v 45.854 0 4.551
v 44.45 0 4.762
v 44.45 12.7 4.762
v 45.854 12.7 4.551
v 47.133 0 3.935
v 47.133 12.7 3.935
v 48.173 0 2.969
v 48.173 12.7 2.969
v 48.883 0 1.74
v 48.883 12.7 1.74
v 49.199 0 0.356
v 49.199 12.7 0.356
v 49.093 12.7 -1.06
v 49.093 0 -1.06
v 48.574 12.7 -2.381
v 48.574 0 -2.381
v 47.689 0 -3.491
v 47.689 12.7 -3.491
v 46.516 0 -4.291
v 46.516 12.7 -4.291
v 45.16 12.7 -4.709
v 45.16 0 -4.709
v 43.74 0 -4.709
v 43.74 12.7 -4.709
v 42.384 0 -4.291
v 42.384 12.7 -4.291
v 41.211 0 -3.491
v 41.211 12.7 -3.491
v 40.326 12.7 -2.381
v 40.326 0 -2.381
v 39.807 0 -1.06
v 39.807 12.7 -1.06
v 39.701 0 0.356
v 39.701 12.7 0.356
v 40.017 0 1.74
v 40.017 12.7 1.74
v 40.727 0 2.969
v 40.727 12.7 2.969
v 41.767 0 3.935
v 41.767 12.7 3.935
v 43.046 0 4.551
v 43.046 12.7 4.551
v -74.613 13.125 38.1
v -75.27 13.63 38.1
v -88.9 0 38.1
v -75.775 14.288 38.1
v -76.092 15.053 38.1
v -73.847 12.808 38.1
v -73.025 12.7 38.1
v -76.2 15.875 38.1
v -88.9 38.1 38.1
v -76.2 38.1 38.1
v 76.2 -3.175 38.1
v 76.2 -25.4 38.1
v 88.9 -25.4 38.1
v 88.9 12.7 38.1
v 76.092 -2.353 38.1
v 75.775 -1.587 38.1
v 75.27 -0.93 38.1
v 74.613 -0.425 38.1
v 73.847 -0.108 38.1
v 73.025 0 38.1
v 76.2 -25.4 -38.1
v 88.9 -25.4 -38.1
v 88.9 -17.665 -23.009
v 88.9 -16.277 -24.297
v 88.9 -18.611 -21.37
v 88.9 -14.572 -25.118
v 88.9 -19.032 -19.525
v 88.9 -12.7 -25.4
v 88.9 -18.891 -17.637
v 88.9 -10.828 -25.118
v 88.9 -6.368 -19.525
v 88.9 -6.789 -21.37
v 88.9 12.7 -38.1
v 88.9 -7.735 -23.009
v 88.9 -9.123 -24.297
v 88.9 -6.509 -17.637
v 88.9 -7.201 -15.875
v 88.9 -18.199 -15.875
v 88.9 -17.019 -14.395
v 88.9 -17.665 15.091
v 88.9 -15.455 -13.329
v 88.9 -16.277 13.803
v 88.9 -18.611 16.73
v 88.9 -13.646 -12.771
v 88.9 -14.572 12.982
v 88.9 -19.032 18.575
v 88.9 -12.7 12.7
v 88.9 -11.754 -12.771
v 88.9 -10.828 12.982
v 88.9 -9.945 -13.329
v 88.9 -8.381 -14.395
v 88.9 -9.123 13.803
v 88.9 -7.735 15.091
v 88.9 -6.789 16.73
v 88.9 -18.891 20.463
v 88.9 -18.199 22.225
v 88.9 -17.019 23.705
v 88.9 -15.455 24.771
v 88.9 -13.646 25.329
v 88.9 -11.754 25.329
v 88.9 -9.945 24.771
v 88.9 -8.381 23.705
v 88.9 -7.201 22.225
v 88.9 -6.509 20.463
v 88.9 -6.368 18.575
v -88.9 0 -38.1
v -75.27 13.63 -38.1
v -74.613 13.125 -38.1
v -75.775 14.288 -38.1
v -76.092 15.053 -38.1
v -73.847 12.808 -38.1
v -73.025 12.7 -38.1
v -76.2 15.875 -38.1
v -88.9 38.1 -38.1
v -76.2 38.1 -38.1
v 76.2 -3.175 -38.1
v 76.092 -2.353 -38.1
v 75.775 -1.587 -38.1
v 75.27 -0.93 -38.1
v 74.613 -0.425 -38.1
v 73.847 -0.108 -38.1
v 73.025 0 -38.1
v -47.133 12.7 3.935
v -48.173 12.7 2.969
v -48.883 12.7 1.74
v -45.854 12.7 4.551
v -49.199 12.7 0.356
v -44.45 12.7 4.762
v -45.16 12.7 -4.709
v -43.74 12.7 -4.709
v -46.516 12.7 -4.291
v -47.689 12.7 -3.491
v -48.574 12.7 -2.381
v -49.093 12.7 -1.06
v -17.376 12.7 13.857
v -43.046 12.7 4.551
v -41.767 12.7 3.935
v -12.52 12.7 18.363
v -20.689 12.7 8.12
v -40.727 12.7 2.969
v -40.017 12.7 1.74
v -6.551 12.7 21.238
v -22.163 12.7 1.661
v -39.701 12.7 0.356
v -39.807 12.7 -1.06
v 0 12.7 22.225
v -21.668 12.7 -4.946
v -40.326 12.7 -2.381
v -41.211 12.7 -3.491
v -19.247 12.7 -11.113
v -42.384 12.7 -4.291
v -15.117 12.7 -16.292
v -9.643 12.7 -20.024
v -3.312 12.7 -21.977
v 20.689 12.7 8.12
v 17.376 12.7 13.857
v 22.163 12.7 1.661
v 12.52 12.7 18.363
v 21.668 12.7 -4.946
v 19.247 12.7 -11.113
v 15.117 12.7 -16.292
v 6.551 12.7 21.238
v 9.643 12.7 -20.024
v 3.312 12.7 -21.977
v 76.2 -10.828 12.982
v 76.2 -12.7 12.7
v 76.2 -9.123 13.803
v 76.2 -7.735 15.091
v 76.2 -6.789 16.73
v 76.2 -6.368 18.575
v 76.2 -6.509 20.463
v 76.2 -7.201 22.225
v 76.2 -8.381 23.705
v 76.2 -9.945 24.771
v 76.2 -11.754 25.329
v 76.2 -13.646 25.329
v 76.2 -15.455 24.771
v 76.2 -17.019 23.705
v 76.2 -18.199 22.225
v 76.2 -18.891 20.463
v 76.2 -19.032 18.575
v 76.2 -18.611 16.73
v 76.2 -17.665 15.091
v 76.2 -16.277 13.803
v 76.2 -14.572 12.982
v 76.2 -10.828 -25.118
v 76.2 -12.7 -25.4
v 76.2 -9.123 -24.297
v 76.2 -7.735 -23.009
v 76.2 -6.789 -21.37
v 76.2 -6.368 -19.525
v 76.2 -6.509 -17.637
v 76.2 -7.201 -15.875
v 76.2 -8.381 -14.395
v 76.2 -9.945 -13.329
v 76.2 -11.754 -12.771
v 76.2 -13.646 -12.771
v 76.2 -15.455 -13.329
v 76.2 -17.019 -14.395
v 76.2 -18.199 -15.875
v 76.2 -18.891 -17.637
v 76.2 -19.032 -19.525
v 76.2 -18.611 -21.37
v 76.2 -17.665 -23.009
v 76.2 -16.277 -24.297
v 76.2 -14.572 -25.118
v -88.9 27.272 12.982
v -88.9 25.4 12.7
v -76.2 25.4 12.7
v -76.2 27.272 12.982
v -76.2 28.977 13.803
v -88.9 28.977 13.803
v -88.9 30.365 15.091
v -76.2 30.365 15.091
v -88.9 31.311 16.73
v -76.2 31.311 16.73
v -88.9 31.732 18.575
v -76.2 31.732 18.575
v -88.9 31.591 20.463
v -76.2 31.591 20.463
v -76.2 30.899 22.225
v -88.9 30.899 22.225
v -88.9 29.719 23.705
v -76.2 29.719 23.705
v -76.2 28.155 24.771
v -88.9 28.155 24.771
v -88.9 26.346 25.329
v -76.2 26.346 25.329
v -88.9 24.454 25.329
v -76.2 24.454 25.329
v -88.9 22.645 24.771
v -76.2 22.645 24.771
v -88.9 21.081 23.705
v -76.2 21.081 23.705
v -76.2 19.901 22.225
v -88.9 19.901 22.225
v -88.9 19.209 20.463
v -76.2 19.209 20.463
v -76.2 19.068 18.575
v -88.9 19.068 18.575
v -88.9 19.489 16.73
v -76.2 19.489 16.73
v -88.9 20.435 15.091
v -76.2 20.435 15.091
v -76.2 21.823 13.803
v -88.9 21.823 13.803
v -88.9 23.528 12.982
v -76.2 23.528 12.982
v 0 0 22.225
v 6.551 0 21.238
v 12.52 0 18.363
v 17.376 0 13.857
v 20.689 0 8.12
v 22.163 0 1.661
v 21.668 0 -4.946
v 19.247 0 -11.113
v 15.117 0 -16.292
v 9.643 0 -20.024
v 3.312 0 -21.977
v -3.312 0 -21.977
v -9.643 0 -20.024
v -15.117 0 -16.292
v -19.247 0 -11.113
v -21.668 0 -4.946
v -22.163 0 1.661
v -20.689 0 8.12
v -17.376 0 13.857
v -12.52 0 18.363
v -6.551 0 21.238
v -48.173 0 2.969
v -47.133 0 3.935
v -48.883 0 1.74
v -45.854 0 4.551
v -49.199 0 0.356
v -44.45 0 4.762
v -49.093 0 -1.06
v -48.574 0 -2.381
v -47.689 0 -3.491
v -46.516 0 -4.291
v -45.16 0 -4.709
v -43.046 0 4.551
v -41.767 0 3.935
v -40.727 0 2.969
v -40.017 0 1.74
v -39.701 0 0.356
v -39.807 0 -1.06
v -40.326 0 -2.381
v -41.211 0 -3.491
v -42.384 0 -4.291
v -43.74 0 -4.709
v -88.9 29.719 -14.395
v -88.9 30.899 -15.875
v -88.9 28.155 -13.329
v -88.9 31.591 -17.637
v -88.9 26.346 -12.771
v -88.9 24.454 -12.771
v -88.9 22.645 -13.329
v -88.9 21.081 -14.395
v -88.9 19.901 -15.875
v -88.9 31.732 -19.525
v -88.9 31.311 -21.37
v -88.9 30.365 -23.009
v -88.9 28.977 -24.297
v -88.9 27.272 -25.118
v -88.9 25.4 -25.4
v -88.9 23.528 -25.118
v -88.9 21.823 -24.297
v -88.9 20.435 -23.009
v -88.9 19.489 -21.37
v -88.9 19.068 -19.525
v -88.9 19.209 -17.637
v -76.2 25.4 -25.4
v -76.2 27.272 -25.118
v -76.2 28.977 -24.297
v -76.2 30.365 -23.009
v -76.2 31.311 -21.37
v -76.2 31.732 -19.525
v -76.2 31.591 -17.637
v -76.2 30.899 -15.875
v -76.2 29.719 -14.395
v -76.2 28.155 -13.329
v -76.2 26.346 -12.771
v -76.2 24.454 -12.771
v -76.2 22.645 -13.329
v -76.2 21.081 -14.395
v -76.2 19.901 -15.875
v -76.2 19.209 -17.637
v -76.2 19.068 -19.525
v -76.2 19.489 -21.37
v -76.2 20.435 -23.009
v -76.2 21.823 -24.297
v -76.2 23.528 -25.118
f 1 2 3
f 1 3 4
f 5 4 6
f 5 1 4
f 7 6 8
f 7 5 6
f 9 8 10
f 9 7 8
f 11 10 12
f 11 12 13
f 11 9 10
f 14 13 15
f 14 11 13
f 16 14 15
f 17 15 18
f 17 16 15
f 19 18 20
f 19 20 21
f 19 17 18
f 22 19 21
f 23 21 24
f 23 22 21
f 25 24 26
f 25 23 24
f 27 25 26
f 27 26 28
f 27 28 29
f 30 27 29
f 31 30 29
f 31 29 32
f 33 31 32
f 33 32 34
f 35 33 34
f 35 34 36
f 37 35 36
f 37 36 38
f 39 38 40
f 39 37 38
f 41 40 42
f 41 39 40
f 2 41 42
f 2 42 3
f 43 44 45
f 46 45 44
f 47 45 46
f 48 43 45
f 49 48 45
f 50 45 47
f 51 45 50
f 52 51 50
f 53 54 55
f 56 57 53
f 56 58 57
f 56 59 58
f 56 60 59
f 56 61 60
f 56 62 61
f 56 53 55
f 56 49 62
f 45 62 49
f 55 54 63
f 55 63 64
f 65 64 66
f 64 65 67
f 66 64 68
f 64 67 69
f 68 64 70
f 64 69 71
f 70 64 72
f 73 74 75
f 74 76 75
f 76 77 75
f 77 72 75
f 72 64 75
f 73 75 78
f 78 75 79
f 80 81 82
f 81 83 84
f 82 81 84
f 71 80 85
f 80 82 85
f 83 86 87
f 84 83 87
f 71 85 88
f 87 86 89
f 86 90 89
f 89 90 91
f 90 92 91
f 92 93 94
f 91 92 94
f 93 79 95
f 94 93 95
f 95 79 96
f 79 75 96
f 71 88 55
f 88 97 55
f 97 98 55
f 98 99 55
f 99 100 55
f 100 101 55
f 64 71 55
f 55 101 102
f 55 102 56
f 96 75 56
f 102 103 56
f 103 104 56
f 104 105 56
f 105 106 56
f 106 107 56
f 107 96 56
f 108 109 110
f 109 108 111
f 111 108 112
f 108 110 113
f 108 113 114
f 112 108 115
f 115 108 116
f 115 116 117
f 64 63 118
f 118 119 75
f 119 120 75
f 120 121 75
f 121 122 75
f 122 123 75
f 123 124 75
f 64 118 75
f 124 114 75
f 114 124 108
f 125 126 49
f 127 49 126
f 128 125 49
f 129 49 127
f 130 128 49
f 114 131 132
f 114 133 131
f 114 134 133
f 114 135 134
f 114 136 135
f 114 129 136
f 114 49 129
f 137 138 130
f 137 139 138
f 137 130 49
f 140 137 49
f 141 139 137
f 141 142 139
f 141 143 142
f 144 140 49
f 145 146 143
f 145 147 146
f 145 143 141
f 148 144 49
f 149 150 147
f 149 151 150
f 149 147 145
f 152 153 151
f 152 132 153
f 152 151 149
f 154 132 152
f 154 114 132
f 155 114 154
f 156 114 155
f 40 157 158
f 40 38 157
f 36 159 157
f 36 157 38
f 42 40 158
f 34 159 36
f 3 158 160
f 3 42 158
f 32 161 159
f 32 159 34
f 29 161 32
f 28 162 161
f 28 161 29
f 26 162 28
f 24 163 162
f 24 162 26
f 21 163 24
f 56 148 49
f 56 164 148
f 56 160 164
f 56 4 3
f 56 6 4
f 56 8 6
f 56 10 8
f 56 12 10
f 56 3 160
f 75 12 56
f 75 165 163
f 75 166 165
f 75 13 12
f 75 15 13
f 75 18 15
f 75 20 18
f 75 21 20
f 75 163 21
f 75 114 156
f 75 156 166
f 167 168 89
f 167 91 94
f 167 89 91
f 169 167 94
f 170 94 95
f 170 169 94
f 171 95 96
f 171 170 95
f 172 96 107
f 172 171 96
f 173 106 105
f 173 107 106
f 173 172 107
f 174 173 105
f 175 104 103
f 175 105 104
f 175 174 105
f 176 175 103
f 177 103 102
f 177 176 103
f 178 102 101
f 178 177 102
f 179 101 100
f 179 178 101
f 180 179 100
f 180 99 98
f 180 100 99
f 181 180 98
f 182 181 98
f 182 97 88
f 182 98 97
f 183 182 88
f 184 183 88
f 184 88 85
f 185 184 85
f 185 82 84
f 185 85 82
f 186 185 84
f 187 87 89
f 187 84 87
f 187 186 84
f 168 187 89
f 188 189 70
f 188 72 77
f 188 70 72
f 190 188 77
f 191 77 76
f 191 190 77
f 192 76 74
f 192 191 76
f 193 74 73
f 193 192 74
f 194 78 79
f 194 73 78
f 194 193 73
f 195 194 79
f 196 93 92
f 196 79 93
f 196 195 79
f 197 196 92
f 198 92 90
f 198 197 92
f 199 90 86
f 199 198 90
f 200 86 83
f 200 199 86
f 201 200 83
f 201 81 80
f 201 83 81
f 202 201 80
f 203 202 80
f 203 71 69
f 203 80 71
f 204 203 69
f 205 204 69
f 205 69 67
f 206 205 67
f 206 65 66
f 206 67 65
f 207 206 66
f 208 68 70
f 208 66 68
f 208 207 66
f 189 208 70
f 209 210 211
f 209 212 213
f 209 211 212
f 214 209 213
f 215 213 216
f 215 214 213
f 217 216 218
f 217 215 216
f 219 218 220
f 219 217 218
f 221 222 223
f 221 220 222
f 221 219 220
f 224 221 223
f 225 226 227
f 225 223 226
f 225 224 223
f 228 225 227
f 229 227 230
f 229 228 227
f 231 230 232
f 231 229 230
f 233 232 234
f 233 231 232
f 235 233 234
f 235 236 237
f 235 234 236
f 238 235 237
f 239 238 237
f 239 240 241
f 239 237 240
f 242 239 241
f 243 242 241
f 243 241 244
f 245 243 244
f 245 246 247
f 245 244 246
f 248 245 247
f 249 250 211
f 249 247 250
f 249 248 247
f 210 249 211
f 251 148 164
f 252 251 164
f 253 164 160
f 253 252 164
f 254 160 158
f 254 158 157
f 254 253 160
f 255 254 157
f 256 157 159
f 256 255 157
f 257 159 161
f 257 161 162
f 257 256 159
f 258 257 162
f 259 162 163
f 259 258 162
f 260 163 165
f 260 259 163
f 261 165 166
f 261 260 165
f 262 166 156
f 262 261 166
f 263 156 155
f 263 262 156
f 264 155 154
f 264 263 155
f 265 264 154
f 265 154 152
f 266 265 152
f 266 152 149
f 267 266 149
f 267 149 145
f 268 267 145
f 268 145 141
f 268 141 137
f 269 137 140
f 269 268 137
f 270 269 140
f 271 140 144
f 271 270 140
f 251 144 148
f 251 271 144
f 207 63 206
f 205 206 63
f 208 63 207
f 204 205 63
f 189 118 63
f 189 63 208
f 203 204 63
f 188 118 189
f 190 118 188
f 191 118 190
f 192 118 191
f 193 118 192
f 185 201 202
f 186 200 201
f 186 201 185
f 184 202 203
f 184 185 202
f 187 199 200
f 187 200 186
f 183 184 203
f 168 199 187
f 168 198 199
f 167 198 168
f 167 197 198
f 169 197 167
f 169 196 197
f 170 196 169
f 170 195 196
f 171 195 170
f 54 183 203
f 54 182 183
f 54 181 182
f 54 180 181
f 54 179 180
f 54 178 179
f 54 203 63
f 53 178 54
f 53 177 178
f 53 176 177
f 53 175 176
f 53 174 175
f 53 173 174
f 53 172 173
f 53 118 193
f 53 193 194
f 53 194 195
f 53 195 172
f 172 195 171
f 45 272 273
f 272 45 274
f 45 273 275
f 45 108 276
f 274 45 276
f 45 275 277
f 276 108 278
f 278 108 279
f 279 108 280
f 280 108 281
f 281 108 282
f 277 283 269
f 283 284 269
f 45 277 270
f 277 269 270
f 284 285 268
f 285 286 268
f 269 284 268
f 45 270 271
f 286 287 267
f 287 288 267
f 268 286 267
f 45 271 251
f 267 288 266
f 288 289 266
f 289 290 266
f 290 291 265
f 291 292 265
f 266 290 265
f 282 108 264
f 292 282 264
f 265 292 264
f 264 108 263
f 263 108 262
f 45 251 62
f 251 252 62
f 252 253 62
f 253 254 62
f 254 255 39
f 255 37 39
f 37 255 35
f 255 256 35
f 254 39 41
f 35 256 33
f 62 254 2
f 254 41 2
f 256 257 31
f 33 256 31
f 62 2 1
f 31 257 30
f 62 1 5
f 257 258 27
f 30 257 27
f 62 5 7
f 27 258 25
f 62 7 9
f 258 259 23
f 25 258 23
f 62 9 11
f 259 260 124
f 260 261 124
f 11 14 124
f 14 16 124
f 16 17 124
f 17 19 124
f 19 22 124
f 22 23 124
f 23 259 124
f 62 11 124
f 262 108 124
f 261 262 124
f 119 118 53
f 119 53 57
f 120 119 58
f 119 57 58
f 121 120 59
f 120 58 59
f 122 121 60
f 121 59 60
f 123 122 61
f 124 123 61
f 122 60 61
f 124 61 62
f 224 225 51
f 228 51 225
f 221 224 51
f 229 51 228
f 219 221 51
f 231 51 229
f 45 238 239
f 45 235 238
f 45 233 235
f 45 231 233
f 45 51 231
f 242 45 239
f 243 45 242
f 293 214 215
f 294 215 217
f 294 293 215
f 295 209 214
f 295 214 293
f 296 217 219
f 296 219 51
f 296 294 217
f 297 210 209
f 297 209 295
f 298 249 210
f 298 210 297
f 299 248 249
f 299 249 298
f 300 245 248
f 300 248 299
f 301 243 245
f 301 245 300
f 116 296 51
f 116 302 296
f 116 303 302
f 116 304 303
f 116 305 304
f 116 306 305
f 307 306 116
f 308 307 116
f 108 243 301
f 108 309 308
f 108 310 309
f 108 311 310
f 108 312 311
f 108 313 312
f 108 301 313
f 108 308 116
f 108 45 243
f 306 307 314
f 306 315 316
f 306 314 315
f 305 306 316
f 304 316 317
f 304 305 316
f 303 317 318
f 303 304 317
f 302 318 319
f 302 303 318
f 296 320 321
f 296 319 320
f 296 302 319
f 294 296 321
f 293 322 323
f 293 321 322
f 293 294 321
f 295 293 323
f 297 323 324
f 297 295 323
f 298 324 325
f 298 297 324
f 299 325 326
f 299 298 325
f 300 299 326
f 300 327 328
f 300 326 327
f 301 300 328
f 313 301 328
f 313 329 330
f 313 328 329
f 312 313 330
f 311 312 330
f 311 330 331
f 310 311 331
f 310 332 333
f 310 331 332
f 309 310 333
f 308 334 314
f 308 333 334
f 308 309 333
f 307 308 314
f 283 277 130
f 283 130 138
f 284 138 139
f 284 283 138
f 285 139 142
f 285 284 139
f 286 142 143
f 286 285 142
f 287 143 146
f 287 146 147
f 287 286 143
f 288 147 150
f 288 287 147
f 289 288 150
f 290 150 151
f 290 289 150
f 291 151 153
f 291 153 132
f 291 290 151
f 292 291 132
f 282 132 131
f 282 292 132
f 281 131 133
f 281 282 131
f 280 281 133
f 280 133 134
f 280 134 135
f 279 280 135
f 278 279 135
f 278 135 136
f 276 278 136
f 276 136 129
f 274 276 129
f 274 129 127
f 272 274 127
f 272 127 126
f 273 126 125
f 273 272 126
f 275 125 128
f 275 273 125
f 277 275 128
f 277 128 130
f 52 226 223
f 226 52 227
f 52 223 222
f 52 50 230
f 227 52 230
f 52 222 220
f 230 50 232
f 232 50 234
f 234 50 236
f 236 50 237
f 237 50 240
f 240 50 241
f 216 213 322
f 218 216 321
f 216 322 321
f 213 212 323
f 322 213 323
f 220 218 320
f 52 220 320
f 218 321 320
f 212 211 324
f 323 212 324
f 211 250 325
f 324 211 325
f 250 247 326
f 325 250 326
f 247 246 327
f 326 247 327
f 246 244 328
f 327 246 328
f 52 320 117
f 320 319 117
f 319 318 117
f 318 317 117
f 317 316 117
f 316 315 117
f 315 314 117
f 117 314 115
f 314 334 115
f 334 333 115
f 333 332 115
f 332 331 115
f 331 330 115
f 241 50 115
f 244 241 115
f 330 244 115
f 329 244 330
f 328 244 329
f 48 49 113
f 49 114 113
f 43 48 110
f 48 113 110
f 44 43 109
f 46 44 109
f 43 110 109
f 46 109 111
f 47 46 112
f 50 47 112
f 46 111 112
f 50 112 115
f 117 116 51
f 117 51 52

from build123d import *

# Parameters (mm, degrees)
SKETCH1_W               = 177.8
SKETCH1_H               = 76.2
SKETCH1_R               = 22.225
SKETCH1_R_2             = 4.7625
BOSS_EXTRUDE1_DEPTH     = 12.7
SKETCH2_W               = 12.7
SKETCH2_H               = 76.2
BOSS_EXTRUDE2_DEPTH     = 25.4
SKETCH3_W               = 12.7
SKETCH3_H               = 76.2
BOSS_EXTRUDE3_DEPTH     = 25.4
CUT_EXTRUDE1_DEPTH      = 174.669888006
CUT_EXTRUDE1_DEPTH_BACK = 174.669888006
SKETCH4_R               = 6.35
FILLET1_R               = 3.175


with BuildPart() as part:
    # Sketch1 → Boss-Extrude1 (new body)
    with BuildSketch(Plane(origin=(0, 0, 0), x_dir=(1, 0, 0), z_dir=(0, 1, 0))):
        Rectangle(SKETCH1_W, SKETCH1_H)
        with Locations(Location((0, 0, 0), (0, 0, 270))):
            Circle(SKETCH1_R, mode=Mode.SUBTRACT)
        with Locations(Location((-44.45, 0, 0), (0, 0, 270))):
            Circle(SKETCH1_R_2, mode=Mode.SUBTRACT)
        with Locations(Location((44.45, 0, 0), (0, 0, 270))):
            Circle(SKETCH1_R_2, mode=Mode.SUBTRACT)
    extrude(amount=BOSS_EXTRUDE1_DEPTH)

    # Sketch2 → Boss-Extrude2 (add)
    with BuildSketch(Plane(origin=(0, 12.7, 0), x_dir=(1, 0, 0), z_dir=(0, 1, 0))):
        with Locations((-82.55, 0)):
            Rectangle(SKETCH2_W, SKETCH2_H)
    extrude(amount=BOSS_EXTRUDE2_DEPTH)

    # Sketch3 → Boss-Extrude3 (add)
    with BuildSketch(Plane.XZ):
        with Locations((82.55, 0)):
            Rectangle(SKETCH3_W, SKETCH3_H)
    extrude(amount=BOSS_EXTRUDE3_DEPTH)

    # Sketch4 → Cut-Extrude1 (cut, two sides: drawn at the far end of the back side and taken through both)
    with BuildSketch(Plane(origin=(-76.2, 0, 0), x_dir=(0, 0, -1), z_dir=(1, 0, 0)).offset(-CUT_EXTRUDE1_DEPTH_BACK)):
        with Locations((-19.05, 25.4)):
            Circle(SKETCH4_R)
        with Locations((19.05, 25.4)):
            Circle(SKETCH4_R)
        with Locations((-19.05, -12.7)):
            Circle(SKETCH4_R)
        with Locations((19.05, -12.7)):
            Circle(SKETCH4_R)
    extrude(amount=CUT_EXTRUDE1_DEPTH + CUT_EXTRUDE1_DEPTH_BACK, mode=Mode.SUBTRACT)

    # Fillet1
    fillet1_edges = [part.edges().sort_by_distance(p)[0] for p in [
        (-76.2, 12.7, 0),
        (76.2, 0, 0),
    ]]
    fillet(fillet1_edges, radius=FILLET1_R)


solid = part.part
